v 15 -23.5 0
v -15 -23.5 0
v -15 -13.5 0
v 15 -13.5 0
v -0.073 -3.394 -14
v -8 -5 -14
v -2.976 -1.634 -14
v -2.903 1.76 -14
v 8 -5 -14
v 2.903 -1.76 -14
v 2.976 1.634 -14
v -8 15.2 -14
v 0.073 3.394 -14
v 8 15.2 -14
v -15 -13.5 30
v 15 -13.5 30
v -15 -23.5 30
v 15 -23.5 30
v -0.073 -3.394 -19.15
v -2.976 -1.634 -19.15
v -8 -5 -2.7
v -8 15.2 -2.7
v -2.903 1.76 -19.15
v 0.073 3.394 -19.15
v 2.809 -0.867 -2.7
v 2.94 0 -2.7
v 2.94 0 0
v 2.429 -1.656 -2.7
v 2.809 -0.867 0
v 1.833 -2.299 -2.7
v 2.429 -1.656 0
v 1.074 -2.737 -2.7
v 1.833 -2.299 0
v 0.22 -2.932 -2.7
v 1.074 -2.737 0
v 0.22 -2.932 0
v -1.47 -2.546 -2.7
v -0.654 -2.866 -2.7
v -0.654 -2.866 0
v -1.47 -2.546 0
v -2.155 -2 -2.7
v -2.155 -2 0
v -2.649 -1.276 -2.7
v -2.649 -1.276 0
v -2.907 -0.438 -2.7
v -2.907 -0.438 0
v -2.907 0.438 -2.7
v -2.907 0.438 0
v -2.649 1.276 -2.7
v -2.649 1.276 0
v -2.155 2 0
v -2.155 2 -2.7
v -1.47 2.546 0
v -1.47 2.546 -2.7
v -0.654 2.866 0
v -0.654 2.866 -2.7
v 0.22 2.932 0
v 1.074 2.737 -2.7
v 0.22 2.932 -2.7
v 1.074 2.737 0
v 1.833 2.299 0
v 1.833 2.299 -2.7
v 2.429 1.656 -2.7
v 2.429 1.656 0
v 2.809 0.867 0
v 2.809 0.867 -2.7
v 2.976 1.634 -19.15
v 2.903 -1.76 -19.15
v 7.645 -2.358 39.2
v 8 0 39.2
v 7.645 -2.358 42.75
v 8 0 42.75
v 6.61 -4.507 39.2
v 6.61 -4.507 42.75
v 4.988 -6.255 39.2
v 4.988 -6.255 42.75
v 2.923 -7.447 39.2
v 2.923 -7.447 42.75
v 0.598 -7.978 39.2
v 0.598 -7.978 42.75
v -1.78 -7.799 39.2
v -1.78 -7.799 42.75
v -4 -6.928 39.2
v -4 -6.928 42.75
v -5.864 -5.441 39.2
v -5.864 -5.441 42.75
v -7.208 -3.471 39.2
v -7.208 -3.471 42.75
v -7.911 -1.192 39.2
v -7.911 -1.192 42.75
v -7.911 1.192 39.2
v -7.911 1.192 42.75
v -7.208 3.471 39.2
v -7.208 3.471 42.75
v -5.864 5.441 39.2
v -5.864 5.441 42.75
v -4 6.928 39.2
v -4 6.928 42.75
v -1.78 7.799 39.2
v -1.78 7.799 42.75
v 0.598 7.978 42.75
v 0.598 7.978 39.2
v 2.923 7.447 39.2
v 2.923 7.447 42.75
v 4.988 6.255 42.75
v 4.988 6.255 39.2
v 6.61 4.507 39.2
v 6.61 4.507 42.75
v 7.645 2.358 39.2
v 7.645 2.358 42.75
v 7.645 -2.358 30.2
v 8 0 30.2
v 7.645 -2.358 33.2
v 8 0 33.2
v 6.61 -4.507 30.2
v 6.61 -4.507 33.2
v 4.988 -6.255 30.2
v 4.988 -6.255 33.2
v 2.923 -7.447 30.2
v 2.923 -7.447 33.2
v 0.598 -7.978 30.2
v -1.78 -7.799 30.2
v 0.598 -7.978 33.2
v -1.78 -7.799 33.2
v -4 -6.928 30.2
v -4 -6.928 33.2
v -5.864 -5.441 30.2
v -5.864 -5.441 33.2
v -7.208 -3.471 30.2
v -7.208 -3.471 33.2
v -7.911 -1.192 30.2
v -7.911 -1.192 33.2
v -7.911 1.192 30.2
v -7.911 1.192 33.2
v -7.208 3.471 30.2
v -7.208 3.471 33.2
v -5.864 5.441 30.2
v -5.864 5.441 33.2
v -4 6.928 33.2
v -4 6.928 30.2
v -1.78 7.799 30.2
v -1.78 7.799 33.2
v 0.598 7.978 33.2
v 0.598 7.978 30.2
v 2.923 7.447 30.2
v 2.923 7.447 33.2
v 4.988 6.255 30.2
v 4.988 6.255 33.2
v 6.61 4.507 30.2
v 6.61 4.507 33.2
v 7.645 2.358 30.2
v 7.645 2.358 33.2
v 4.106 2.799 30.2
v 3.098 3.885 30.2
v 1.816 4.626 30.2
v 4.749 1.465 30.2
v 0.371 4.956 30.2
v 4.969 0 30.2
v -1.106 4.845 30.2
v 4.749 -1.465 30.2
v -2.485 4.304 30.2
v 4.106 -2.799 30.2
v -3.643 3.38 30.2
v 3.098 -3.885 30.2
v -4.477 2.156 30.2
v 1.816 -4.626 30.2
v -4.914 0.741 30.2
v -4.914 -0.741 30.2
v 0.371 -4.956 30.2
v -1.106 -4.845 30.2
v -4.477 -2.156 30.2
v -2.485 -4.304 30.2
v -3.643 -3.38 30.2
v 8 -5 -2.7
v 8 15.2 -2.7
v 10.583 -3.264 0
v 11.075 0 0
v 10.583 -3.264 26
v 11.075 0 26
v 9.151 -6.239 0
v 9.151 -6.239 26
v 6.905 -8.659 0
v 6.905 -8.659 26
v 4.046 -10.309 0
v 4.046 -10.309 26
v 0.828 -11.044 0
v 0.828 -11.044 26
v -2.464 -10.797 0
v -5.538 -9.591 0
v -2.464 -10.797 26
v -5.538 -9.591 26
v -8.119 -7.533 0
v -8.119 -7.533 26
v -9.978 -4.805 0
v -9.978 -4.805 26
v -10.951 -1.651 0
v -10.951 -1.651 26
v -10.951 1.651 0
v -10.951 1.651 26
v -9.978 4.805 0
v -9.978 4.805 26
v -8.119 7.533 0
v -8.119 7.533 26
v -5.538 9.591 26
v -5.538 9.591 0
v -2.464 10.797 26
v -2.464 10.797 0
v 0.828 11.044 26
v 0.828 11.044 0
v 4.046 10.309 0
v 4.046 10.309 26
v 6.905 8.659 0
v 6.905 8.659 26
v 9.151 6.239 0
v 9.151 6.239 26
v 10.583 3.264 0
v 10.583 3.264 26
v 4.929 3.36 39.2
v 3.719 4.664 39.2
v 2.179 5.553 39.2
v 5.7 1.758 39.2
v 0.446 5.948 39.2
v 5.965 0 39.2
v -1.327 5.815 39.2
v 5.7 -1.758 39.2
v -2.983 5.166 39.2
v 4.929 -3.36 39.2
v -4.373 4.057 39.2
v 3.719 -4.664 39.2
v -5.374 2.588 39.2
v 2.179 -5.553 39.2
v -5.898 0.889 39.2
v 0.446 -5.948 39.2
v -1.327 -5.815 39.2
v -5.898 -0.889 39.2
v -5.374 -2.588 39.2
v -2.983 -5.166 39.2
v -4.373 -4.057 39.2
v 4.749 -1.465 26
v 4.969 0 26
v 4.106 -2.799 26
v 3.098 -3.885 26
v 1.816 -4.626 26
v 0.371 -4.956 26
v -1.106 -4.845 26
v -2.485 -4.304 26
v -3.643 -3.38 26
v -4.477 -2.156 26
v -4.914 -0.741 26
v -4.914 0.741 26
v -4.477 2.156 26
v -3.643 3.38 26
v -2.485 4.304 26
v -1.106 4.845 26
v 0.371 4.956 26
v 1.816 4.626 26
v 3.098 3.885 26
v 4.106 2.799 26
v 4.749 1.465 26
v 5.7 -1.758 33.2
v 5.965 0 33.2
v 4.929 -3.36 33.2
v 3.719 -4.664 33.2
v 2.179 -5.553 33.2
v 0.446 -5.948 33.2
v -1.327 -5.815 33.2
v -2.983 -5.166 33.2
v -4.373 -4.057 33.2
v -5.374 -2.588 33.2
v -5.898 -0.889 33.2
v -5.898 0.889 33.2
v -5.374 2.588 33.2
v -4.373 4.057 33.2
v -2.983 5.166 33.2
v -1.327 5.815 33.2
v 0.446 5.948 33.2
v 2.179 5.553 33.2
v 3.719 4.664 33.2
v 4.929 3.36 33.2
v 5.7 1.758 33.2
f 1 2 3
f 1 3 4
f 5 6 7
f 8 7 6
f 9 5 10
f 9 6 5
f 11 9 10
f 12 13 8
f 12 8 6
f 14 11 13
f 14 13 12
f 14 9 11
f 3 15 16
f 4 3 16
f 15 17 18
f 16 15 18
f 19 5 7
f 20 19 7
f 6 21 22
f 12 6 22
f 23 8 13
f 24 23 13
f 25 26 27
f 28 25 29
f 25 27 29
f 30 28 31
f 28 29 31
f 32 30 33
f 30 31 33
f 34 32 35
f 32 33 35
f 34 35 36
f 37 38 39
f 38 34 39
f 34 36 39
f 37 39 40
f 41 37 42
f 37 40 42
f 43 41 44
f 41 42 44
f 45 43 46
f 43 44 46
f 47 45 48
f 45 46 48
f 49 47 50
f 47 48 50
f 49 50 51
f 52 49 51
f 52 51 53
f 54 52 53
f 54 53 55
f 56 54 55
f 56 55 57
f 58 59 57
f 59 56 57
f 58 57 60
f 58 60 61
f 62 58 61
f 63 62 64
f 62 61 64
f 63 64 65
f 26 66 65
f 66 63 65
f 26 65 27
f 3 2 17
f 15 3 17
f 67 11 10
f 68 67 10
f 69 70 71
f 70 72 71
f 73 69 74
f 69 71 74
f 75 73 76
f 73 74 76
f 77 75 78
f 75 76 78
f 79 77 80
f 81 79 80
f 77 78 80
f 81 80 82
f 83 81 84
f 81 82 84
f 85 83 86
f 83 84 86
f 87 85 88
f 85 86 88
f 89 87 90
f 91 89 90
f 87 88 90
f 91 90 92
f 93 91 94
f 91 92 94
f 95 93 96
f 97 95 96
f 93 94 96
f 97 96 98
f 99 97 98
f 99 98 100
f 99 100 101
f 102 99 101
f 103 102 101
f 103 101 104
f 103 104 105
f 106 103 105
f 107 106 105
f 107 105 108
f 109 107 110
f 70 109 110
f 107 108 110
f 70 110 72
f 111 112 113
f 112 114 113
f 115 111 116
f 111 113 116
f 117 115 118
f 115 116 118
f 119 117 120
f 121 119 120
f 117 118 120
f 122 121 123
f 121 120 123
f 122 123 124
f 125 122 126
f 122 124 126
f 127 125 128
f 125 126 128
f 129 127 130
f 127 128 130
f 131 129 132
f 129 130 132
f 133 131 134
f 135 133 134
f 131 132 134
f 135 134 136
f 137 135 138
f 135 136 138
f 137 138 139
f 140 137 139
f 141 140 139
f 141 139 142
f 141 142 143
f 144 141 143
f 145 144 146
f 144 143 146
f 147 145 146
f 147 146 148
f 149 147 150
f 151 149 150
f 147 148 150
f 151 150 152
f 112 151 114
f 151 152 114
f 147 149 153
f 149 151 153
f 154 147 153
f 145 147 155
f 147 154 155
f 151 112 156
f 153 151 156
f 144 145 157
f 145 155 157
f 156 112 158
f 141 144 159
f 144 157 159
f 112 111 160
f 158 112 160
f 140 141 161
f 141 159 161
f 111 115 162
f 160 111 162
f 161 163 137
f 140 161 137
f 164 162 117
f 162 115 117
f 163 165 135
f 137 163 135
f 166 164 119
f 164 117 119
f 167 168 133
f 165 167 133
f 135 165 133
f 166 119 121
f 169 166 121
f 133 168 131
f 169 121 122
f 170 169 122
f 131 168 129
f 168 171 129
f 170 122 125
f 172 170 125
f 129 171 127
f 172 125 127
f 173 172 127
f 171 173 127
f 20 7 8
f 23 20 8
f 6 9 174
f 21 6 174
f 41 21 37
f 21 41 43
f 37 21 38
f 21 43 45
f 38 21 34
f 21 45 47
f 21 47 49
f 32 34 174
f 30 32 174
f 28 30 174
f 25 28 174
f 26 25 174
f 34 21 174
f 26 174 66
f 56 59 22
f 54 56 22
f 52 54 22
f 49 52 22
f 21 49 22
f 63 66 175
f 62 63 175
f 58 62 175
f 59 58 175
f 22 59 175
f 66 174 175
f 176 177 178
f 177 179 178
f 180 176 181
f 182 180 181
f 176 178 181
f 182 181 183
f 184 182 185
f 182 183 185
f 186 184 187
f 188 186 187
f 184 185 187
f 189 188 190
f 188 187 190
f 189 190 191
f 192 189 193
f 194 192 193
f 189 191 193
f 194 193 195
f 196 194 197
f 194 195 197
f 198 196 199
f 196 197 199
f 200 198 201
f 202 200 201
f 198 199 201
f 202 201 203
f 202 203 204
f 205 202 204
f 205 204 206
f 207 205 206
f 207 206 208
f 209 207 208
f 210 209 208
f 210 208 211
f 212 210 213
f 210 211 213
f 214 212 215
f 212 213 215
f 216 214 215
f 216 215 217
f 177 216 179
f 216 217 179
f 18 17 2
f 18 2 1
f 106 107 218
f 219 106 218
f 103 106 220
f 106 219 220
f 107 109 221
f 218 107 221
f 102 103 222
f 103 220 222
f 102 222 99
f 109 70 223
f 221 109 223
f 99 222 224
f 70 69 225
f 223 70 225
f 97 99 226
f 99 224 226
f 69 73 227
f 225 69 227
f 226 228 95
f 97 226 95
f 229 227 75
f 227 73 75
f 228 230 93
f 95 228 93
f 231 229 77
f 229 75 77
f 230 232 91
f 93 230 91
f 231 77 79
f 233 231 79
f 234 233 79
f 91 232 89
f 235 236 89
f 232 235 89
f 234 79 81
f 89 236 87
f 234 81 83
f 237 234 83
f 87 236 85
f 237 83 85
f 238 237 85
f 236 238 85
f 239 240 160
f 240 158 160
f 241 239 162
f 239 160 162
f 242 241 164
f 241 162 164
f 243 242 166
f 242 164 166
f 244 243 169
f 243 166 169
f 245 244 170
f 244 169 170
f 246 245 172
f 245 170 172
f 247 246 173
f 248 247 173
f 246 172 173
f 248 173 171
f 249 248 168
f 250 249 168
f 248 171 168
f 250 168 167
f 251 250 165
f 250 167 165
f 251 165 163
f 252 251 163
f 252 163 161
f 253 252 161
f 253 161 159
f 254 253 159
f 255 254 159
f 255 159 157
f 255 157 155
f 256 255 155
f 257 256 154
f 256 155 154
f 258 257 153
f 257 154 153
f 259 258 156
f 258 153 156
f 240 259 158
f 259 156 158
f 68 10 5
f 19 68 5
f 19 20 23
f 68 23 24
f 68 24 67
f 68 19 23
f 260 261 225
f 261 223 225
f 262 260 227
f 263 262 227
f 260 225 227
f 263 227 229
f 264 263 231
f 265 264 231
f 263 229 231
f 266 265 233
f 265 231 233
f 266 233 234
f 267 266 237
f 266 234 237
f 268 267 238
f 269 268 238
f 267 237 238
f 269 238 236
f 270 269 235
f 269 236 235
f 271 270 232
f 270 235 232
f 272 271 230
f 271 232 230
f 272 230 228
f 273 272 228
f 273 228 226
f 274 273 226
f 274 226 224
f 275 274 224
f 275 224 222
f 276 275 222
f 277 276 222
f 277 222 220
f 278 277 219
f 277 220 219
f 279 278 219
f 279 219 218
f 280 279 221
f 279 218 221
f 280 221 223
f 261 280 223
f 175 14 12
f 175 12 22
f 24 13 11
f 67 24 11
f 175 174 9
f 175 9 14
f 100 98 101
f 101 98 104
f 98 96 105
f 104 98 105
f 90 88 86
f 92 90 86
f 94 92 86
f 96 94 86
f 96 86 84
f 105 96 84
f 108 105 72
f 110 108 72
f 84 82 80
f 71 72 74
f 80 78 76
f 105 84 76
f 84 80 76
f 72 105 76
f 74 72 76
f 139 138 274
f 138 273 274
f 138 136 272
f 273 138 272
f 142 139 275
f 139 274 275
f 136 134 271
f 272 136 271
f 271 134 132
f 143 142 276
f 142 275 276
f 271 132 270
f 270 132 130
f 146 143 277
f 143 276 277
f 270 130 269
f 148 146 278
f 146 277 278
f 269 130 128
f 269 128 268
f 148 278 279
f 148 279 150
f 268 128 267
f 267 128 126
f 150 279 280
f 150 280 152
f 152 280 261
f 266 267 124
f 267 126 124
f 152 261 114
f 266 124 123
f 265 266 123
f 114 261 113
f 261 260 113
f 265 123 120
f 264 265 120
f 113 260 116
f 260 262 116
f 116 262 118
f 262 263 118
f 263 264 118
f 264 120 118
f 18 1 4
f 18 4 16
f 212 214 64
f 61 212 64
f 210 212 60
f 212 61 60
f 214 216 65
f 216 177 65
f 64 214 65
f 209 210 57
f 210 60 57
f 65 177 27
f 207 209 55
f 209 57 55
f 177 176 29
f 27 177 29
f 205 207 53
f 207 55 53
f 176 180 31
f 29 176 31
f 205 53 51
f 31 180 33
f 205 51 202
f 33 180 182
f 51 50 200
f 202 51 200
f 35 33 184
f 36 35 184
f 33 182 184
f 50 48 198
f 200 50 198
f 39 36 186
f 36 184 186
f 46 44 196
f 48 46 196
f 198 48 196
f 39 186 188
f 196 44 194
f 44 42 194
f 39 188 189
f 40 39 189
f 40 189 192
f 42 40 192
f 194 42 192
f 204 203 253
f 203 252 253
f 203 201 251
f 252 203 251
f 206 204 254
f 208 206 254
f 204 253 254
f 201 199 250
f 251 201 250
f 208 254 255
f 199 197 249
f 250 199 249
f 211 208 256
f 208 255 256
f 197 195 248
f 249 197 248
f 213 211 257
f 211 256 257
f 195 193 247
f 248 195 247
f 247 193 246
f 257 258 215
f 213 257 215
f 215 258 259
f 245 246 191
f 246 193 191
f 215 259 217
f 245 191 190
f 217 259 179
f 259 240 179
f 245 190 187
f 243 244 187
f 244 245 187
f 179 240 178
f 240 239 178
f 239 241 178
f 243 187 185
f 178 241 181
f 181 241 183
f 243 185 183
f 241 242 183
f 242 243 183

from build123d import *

# Parameters (mm, degrees)
F2_R      = 2.94
F3_DEPTH  = 7.65
F5_W      = 30
F5_H      = 30
F6_DEPTH  = 10
F7_W      = 20.2
F7_H      = 11.3
F8_DEPTH  = 8
F10_DEPTH = 5.15


with BuildPart() as f1:
    # F0 (on Front) → F1 (revolve)
    with BuildSketch(Plane.XZ):
        Polygon((8, 42.75), (0, 42.75), (0, 0), (11.075, 0), (11.075, 26), (4.9694790867, 26), (4.9694790867, 30.2), (8, 30.2), (8, 33.2), (5.965, 33.2), (5.965, 39.2), (8, 39.2), align=None)
    revolve(axis=Axis((0, 0, 21.375), (0, 0, -1)))

    # F2 (on face) → F3 (join)
    with BuildSketch(Plane(origin=(0, 0, 0), x_dir=(1, 0, 0), z_dir=(0, 0, -1))):
        Circle(F2_R)
    extrude(amount=F3_DEPTH)

    # F7 (on Right) → F8 (join, symmetric)
    with BuildSketch(Plane.YZ):
        with Locations((5.1, -8.35)):
            Rectangle(F7_W, F7_H)
    extrude(amount=F8_DEPTH, both=True)

    # F9 (on face) → F10 (join)
    with BuildSketch(Plane(origin=(0, 0, -14), x_dir=(1, 0, 0), z_dir=(0, 0, -1))):
        Polygon((-2.9029249615, -1.7600643931), (0.072797996, -3.3940389585), (2.9757229575, -1.6339745654), (2.9029249615, 1.7600643931), (-0.072797996, 3.3940389585), (-2.9757229575, 1.6339745654), align=None)
    extrude(amount=F10_DEPTH)


with BuildPart() as f6:
    # F5 (on offset) → F6 (new body)
    with BuildSketch(Plane.XZ.offset(23.5)):
        with Locations((0, 15)):
            Rectangle(F5_W, F5_H)
    extrude(amount=-F6_DEPTH)


solid = Compound([f1.part, f6.part])
